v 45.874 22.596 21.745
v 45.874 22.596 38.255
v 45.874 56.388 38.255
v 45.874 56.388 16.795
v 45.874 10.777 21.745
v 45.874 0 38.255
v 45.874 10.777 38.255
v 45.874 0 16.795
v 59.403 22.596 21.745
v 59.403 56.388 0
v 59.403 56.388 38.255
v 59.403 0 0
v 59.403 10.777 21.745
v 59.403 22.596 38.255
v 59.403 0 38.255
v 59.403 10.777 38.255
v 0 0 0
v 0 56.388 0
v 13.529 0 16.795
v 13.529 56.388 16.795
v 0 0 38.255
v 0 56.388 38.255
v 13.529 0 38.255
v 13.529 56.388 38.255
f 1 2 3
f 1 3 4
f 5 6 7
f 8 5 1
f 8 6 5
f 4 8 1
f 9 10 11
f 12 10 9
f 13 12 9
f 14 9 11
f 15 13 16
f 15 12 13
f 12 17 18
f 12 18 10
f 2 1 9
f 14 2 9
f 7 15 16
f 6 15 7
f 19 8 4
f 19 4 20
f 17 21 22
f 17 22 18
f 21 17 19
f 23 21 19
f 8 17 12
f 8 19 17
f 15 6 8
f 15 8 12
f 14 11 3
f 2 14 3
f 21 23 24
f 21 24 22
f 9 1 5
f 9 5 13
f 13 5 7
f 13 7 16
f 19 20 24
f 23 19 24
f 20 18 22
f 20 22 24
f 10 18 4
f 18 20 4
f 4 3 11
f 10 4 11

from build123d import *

# Parameters (mm, degrees)
F1_DEPTH = 56.388
F2_W     = 13.5290427133
F2_H     = 11.8184806779
F3_DEPTH = 16.51


with BuildPart() as f1:
    # F0 (on Front) → F1 (new body)
    with BuildSketch(Plane.XZ):
        Polygon((0, 38.2545590401), (0, 0), (59.4034036621, 0), (59.4034036621, 38.2545590401), (45.8743609488, 38.2545590401), (45.8743609488, 16.7946852744), (13.5290427133, 16.7946852744), (13.5290427133, 38.2545590401), align=None)
    extrude(amount=-F1_DEPTH)

    # F2 (on face) → F3 (cut)
    with BuildSketch(Plane.XY.offset(38.2545590401)):
        with Locations((52.6388823055, 16.6865340434)):
            Rectangle(F2_W, F2_H)
    extrude(amount=-F3_DEPTH, mode=Mode.SUBTRACT)


solid = f1.part
